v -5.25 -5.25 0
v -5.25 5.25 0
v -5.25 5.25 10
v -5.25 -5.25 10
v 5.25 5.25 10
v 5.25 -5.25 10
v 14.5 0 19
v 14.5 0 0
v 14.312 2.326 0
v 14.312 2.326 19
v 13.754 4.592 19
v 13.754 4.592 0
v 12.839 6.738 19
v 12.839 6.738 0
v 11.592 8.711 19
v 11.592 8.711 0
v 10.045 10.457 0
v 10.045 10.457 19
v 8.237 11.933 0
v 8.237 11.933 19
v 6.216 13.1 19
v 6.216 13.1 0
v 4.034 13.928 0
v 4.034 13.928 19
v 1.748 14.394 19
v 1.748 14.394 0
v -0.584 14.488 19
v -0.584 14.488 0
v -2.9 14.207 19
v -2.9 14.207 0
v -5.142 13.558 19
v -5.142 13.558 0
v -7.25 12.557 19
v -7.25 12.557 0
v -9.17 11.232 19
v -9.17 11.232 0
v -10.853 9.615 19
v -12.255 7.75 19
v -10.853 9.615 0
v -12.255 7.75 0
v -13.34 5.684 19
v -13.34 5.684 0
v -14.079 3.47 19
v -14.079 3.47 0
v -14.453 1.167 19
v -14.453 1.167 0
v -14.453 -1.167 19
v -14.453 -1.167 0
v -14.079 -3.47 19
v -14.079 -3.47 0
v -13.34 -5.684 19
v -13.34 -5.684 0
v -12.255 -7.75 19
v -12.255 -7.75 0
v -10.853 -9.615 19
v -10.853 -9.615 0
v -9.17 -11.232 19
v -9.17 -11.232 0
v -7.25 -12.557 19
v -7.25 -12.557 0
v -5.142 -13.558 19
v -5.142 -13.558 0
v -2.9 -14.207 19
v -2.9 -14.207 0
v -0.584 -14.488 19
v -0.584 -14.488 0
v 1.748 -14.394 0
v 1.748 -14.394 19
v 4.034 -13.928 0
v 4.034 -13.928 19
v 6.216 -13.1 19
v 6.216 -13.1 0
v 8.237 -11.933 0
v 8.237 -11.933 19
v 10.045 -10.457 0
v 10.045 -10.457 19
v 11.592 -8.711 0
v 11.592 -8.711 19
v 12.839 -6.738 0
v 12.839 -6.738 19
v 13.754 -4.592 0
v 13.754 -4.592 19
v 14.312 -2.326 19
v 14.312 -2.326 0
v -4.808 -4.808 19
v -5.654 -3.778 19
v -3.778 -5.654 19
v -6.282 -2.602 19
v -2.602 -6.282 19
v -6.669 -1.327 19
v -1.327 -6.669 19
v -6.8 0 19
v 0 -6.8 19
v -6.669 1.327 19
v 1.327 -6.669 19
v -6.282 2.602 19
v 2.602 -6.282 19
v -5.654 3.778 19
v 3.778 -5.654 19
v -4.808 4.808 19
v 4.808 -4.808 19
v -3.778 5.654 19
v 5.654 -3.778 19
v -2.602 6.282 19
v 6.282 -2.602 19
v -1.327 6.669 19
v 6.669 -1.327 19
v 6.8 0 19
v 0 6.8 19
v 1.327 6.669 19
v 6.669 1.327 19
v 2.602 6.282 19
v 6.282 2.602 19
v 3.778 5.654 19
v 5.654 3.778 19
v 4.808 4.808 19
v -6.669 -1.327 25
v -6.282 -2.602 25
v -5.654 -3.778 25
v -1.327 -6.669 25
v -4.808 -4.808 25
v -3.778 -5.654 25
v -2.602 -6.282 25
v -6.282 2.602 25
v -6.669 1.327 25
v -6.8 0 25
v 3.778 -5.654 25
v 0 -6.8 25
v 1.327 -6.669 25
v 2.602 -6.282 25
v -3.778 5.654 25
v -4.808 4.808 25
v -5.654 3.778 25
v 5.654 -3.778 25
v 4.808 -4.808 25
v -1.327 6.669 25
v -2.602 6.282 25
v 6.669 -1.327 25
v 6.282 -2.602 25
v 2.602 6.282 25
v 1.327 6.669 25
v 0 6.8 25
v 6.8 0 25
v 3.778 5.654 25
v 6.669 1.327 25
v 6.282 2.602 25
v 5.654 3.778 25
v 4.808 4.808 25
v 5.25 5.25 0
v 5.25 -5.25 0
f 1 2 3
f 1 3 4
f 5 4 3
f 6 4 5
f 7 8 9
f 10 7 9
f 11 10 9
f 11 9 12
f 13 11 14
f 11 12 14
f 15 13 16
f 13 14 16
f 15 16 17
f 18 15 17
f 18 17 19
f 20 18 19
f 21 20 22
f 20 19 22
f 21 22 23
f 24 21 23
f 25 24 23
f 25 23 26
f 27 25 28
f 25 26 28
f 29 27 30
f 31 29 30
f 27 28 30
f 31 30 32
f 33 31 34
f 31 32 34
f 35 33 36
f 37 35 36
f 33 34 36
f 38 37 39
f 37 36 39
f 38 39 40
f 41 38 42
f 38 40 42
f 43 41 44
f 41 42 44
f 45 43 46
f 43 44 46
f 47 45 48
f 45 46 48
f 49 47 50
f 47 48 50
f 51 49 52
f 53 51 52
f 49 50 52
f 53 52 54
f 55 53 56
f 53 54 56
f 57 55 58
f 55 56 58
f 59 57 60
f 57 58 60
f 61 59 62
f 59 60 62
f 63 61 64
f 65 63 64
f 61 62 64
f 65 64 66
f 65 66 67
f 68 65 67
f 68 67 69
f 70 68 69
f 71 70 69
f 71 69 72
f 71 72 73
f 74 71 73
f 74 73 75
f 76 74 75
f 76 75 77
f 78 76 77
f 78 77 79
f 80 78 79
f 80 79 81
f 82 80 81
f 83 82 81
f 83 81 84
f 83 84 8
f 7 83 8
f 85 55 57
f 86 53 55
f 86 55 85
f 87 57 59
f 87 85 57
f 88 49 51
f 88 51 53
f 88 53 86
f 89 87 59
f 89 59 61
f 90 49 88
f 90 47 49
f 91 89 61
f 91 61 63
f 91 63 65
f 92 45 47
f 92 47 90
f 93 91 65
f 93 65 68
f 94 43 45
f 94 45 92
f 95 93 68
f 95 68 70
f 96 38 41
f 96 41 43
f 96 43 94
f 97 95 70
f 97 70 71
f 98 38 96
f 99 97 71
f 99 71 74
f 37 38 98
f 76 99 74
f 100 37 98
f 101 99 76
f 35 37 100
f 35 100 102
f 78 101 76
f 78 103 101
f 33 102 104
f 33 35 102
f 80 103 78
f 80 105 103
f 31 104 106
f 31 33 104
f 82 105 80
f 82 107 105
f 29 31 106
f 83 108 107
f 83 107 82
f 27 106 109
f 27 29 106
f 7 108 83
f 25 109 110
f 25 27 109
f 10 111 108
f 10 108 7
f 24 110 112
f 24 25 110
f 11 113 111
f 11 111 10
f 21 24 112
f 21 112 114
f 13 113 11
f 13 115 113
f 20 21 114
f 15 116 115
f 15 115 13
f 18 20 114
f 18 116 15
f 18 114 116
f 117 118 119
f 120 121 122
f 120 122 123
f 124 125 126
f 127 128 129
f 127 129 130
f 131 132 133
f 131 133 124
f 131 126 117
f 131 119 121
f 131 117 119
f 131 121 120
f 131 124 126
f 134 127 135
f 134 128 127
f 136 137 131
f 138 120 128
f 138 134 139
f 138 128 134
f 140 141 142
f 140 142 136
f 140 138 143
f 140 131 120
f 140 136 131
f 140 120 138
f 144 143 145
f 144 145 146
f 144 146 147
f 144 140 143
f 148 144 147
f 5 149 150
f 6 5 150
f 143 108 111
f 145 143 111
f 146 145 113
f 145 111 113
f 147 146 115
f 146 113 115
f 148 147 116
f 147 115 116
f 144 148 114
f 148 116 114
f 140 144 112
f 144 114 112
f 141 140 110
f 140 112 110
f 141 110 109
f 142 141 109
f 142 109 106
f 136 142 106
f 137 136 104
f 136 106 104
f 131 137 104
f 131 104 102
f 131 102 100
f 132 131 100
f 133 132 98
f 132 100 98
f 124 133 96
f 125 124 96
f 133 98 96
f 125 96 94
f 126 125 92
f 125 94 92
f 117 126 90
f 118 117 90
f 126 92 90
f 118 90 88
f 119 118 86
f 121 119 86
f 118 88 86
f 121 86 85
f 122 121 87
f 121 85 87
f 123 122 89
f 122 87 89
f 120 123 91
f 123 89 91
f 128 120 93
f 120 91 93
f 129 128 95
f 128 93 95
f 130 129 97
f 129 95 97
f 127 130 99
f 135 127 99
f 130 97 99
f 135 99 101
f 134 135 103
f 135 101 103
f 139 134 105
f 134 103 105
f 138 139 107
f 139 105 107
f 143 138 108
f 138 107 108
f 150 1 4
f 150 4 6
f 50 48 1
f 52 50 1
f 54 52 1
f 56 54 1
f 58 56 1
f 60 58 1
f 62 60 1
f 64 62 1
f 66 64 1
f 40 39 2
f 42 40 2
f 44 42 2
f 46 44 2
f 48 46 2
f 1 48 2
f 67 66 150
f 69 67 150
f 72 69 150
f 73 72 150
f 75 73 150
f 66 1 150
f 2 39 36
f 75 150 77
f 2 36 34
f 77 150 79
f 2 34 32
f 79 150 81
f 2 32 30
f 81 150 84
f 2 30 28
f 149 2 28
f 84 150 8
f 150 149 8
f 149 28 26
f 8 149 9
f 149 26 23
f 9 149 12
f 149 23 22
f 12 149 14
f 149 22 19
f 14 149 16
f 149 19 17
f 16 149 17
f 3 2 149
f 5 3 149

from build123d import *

# Parameters (mm, degrees)
F0_R     = 14.5
F1_DEPTH = 19
F2_R     = 6.8
F3_DEPTH = 6
F4_W     = 10.5
F4_H     = 10.5
F5_DEPTH = 10


# Not quite as in the source:
# - a feature of the source that left no trace in its solid (it failed there, or was rolled back) is left out


with BuildPart() as f1:
    # F0 (on Top) → F1 (new body)
    with BuildSketch(Plane.XY):
        Circle(F0_R)
    extrude(amount=F1_DEPTH)

    # F2 (on face) → F3 (join)
    with BuildSketch(Plane.XY.offset(19)):
        Circle(F2_R)
    extrude(amount=F3_DEPTH)

    # F4 (on face) → F5 (cut)
    with BuildSketch(Plane(origin=(0, 0, 0), x_dir=(1, 0, 0), z_dir=(0, 0, -1))):
        Rectangle(F4_W, F4_H)
    extrude(amount=-F5_DEPTH, mode=Mode.SUBTRACT)


solid = f1.part
